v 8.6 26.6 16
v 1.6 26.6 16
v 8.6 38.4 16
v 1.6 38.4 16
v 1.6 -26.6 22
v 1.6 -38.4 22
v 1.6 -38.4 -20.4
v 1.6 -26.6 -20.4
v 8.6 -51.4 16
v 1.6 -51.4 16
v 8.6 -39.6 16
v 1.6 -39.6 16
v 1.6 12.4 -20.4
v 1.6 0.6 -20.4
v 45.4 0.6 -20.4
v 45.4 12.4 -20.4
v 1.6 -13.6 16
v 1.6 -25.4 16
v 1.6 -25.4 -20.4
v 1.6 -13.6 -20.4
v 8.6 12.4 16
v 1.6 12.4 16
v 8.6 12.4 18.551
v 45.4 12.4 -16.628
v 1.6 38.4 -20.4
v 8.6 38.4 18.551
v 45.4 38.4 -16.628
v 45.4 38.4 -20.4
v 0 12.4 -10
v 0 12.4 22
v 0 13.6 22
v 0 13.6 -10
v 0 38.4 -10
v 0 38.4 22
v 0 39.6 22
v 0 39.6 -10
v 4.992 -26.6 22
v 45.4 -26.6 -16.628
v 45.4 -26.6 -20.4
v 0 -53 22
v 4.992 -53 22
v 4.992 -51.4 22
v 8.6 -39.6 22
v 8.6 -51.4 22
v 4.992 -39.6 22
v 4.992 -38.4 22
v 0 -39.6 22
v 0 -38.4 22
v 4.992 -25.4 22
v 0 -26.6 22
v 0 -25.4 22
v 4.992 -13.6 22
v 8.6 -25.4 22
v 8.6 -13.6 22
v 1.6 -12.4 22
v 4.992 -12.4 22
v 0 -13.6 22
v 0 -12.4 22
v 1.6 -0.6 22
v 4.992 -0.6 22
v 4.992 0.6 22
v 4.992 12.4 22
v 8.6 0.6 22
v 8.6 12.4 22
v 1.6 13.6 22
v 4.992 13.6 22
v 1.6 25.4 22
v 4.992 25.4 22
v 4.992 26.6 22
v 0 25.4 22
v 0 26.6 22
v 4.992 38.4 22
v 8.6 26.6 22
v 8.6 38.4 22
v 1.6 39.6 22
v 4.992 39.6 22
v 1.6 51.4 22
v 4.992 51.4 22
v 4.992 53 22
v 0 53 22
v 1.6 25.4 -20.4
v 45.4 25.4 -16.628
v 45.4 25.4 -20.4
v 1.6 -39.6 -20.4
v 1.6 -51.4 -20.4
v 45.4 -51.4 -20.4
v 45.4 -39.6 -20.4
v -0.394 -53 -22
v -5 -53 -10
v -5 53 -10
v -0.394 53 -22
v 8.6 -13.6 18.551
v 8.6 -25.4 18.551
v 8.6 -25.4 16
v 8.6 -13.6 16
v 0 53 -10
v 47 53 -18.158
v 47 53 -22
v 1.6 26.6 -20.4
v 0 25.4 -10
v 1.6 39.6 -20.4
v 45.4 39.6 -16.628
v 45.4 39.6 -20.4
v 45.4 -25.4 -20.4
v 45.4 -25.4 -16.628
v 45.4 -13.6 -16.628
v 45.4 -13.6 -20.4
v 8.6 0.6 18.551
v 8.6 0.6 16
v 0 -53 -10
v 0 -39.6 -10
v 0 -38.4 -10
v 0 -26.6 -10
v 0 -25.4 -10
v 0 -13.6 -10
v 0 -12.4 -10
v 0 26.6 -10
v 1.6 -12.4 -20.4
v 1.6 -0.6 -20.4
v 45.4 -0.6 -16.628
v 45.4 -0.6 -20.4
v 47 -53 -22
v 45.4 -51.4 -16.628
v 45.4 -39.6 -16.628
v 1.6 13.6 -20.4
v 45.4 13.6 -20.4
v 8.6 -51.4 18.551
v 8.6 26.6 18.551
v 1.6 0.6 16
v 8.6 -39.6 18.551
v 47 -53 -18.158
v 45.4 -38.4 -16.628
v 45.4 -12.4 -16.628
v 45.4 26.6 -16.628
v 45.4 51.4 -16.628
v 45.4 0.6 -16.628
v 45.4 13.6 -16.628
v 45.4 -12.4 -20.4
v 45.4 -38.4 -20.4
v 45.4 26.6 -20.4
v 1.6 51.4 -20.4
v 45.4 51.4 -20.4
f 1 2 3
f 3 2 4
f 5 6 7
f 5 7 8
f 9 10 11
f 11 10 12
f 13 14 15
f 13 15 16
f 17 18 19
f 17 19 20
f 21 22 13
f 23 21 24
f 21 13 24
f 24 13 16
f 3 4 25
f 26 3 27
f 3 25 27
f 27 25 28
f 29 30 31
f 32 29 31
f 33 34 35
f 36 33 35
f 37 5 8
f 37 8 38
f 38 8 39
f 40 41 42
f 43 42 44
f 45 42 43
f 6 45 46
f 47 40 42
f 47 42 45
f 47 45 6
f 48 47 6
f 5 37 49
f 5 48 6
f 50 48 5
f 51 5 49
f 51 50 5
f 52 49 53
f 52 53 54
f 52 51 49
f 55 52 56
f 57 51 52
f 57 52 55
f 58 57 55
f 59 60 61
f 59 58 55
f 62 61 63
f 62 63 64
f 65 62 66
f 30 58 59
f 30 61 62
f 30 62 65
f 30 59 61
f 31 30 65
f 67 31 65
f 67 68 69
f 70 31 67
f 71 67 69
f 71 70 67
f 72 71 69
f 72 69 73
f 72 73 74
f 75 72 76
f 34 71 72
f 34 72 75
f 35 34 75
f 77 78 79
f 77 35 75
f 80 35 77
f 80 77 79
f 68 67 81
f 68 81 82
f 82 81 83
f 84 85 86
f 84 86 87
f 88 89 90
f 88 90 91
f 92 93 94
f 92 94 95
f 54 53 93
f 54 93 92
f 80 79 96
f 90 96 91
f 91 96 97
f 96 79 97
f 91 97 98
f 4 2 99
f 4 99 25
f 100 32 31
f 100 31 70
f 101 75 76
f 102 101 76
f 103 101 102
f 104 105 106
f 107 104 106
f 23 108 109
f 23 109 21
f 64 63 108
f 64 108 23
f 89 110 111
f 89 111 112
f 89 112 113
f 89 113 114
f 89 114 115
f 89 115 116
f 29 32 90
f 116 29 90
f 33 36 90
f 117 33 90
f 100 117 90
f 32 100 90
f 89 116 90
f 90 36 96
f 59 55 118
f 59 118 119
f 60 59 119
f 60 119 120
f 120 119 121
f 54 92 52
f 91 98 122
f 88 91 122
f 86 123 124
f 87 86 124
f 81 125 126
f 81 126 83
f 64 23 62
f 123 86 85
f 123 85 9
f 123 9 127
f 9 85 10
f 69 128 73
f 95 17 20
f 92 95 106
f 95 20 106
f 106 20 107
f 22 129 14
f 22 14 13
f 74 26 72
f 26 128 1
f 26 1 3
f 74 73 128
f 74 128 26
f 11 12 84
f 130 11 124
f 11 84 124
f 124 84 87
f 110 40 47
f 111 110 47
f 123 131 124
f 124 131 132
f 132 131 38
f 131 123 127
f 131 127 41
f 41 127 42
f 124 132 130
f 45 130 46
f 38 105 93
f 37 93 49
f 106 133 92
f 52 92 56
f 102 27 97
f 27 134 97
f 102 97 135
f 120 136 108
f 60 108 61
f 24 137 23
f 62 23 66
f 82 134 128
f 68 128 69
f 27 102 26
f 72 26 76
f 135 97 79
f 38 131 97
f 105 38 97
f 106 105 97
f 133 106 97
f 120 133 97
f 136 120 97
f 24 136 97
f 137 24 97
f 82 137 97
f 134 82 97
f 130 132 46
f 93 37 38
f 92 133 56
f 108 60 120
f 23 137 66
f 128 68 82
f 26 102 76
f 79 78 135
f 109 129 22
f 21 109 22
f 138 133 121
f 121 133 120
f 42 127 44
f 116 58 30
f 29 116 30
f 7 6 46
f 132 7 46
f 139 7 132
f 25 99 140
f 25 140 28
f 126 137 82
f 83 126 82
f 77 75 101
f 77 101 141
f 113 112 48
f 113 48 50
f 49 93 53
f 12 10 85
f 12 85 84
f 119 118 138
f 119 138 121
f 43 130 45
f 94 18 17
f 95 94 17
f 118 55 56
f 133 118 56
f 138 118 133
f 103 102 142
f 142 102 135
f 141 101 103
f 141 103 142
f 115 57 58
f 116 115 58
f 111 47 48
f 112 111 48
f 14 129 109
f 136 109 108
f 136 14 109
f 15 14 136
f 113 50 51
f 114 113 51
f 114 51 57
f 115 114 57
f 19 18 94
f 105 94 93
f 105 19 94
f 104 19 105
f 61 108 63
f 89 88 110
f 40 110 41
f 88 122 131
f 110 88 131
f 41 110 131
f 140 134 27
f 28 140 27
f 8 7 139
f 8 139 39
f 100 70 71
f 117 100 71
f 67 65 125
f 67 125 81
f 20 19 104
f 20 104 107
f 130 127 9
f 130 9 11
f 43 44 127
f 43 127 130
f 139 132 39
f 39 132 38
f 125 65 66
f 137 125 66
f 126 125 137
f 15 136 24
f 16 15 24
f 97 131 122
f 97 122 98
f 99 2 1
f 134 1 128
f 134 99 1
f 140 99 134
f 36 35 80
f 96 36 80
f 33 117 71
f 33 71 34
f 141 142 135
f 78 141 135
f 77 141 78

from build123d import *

# Parameters (mm, degrees)
F0_W      = 106
F0_H      = 44
F1_DEPTH  = 47
F2_T      = -1.6
F3_W      = 47
F3_H      = 1.2
F3_W_2    = 46.578951
F4_DEPTH  = 42.4
F6_DEPTH  = 143
F7_W      = 11.8
F7_H      = 6
F8_DEPTH  = 7
F10_DEPTH = 5
F11_W     = 11.8
F11_H     = 6
F12_DEPTH = 7
F13_W     = 11.8
F13_H     = 6
F14_DEPTH = 7
F15_W     = 11.8
F15_H     = 6
F16_DEPTH = 7
F18_DEPTH = 119


with BuildPart() as f1:
    # F0 (on Right) → F1 (new body)
    with BuildSketch(Plane.YZ):
        Rectangle(F0_W, F0_H)
    extrude(amount=F1_DEPTH)

    # F2
    f2_openings = [f1.faces().sort_by_distance(p)[0] for p in [
        (23.5, 0, 22),
    ]]
    offset(amount=F2_T, openings=f2_openings)

    # F3 (on face) → F4 (join)
    with BuildSketch(Plane.XY.offset(-20.4)):
        with Locations((23.5, 0)):
            Rectangle(F3_W, F3_H)
        with Locations((23.289475, 13)):
            Rectangle(F3_W_2, F3_H)
        with Locations((23.289475, 26)):
            Rectangle(F3_W_2, F3_H)
        with Locations((23.289475, 39)):
            Rectangle(F3_W_2, F3_H)
        with Locations((23.289475, -13)):
            Rectangle(F3_W_2, F3_H)
        with Locations((23.289475, -26)):
            Rectangle(F3_W_2, F3_H)
        with Locations((23.289475, -39)):
            Rectangle(F3_W_2, F3_H)
    extrude(amount=F4_DEPTH)

    # F5 (on face) → F6 (cut)
    with BuildSketch(Plane(origin=(0, 53, 0), x_dir=(-1, 0, 0), z_dir=(0, 1, 0))):
        Polygon((-4.991917, 22), (-47, 22), (-47, -18.157896), align=None)
    extrude(amount=-F6_DEPTH, mode=Mode.SUBTRACT)

    # F7 (on face) → F8 (join)
    with BuildSketch(Plane.YZ.offset(1.6)):
        with Locations((32.5, 19)):
            Rectangle(F7_W, F7_H)
    extrude(amount=F8_DEPTH)

    # F9 (on face) → F10 (join)
    with BuildSketch(Plane(origin=(0, 0, 0), x_dir=(0, -1, 0), z_dir=(-1, 0, 0))):
        Polygon((-53, -22), (-8.871453, -22), (-3.871453, -22), (53, -22), (53, -10), (-53, -10), align=None)
    extrude(amount=F10_DEPTH)

    # F11 (on face) → F12 (join)
    with BuildSketch(Plane.YZ.offset(1.6)):
        with Locations((6.5, 19)):
            Rectangle(F11_W, F11_H)
    extrude(amount=F12_DEPTH)

    # F13 (on face) → F14 (join)
    with BuildSketch(Plane.YZ.offset(1.6)):
        with Locations((-19.5, 19)):
            Rectangle(F13_W, F13_H)
    extrude(amount=F14_DEPTH)

    # F15 (on face) → F16 (join)
    with BuildSketch(Plane.YZ.offset(1.6)):
        with Locations((-45.5, 19)):
            Rectangle(F15_W, F15_H)
    extrude(amount=F16_DEPTH)

    # F17 (on face) → F18 (cut)
    with BuildSketch(Plane(origin=(0, 53, 0), x_dir=(-1, 0, 0), z_dir=(0, 1, 0))):
        Polygon((5, -22), (5, -10), (0.393632, -22), align=None)
    extrude(amount=-F18_DEPTH, mode=Mode.SUBTRACT)


solid = f1.part
